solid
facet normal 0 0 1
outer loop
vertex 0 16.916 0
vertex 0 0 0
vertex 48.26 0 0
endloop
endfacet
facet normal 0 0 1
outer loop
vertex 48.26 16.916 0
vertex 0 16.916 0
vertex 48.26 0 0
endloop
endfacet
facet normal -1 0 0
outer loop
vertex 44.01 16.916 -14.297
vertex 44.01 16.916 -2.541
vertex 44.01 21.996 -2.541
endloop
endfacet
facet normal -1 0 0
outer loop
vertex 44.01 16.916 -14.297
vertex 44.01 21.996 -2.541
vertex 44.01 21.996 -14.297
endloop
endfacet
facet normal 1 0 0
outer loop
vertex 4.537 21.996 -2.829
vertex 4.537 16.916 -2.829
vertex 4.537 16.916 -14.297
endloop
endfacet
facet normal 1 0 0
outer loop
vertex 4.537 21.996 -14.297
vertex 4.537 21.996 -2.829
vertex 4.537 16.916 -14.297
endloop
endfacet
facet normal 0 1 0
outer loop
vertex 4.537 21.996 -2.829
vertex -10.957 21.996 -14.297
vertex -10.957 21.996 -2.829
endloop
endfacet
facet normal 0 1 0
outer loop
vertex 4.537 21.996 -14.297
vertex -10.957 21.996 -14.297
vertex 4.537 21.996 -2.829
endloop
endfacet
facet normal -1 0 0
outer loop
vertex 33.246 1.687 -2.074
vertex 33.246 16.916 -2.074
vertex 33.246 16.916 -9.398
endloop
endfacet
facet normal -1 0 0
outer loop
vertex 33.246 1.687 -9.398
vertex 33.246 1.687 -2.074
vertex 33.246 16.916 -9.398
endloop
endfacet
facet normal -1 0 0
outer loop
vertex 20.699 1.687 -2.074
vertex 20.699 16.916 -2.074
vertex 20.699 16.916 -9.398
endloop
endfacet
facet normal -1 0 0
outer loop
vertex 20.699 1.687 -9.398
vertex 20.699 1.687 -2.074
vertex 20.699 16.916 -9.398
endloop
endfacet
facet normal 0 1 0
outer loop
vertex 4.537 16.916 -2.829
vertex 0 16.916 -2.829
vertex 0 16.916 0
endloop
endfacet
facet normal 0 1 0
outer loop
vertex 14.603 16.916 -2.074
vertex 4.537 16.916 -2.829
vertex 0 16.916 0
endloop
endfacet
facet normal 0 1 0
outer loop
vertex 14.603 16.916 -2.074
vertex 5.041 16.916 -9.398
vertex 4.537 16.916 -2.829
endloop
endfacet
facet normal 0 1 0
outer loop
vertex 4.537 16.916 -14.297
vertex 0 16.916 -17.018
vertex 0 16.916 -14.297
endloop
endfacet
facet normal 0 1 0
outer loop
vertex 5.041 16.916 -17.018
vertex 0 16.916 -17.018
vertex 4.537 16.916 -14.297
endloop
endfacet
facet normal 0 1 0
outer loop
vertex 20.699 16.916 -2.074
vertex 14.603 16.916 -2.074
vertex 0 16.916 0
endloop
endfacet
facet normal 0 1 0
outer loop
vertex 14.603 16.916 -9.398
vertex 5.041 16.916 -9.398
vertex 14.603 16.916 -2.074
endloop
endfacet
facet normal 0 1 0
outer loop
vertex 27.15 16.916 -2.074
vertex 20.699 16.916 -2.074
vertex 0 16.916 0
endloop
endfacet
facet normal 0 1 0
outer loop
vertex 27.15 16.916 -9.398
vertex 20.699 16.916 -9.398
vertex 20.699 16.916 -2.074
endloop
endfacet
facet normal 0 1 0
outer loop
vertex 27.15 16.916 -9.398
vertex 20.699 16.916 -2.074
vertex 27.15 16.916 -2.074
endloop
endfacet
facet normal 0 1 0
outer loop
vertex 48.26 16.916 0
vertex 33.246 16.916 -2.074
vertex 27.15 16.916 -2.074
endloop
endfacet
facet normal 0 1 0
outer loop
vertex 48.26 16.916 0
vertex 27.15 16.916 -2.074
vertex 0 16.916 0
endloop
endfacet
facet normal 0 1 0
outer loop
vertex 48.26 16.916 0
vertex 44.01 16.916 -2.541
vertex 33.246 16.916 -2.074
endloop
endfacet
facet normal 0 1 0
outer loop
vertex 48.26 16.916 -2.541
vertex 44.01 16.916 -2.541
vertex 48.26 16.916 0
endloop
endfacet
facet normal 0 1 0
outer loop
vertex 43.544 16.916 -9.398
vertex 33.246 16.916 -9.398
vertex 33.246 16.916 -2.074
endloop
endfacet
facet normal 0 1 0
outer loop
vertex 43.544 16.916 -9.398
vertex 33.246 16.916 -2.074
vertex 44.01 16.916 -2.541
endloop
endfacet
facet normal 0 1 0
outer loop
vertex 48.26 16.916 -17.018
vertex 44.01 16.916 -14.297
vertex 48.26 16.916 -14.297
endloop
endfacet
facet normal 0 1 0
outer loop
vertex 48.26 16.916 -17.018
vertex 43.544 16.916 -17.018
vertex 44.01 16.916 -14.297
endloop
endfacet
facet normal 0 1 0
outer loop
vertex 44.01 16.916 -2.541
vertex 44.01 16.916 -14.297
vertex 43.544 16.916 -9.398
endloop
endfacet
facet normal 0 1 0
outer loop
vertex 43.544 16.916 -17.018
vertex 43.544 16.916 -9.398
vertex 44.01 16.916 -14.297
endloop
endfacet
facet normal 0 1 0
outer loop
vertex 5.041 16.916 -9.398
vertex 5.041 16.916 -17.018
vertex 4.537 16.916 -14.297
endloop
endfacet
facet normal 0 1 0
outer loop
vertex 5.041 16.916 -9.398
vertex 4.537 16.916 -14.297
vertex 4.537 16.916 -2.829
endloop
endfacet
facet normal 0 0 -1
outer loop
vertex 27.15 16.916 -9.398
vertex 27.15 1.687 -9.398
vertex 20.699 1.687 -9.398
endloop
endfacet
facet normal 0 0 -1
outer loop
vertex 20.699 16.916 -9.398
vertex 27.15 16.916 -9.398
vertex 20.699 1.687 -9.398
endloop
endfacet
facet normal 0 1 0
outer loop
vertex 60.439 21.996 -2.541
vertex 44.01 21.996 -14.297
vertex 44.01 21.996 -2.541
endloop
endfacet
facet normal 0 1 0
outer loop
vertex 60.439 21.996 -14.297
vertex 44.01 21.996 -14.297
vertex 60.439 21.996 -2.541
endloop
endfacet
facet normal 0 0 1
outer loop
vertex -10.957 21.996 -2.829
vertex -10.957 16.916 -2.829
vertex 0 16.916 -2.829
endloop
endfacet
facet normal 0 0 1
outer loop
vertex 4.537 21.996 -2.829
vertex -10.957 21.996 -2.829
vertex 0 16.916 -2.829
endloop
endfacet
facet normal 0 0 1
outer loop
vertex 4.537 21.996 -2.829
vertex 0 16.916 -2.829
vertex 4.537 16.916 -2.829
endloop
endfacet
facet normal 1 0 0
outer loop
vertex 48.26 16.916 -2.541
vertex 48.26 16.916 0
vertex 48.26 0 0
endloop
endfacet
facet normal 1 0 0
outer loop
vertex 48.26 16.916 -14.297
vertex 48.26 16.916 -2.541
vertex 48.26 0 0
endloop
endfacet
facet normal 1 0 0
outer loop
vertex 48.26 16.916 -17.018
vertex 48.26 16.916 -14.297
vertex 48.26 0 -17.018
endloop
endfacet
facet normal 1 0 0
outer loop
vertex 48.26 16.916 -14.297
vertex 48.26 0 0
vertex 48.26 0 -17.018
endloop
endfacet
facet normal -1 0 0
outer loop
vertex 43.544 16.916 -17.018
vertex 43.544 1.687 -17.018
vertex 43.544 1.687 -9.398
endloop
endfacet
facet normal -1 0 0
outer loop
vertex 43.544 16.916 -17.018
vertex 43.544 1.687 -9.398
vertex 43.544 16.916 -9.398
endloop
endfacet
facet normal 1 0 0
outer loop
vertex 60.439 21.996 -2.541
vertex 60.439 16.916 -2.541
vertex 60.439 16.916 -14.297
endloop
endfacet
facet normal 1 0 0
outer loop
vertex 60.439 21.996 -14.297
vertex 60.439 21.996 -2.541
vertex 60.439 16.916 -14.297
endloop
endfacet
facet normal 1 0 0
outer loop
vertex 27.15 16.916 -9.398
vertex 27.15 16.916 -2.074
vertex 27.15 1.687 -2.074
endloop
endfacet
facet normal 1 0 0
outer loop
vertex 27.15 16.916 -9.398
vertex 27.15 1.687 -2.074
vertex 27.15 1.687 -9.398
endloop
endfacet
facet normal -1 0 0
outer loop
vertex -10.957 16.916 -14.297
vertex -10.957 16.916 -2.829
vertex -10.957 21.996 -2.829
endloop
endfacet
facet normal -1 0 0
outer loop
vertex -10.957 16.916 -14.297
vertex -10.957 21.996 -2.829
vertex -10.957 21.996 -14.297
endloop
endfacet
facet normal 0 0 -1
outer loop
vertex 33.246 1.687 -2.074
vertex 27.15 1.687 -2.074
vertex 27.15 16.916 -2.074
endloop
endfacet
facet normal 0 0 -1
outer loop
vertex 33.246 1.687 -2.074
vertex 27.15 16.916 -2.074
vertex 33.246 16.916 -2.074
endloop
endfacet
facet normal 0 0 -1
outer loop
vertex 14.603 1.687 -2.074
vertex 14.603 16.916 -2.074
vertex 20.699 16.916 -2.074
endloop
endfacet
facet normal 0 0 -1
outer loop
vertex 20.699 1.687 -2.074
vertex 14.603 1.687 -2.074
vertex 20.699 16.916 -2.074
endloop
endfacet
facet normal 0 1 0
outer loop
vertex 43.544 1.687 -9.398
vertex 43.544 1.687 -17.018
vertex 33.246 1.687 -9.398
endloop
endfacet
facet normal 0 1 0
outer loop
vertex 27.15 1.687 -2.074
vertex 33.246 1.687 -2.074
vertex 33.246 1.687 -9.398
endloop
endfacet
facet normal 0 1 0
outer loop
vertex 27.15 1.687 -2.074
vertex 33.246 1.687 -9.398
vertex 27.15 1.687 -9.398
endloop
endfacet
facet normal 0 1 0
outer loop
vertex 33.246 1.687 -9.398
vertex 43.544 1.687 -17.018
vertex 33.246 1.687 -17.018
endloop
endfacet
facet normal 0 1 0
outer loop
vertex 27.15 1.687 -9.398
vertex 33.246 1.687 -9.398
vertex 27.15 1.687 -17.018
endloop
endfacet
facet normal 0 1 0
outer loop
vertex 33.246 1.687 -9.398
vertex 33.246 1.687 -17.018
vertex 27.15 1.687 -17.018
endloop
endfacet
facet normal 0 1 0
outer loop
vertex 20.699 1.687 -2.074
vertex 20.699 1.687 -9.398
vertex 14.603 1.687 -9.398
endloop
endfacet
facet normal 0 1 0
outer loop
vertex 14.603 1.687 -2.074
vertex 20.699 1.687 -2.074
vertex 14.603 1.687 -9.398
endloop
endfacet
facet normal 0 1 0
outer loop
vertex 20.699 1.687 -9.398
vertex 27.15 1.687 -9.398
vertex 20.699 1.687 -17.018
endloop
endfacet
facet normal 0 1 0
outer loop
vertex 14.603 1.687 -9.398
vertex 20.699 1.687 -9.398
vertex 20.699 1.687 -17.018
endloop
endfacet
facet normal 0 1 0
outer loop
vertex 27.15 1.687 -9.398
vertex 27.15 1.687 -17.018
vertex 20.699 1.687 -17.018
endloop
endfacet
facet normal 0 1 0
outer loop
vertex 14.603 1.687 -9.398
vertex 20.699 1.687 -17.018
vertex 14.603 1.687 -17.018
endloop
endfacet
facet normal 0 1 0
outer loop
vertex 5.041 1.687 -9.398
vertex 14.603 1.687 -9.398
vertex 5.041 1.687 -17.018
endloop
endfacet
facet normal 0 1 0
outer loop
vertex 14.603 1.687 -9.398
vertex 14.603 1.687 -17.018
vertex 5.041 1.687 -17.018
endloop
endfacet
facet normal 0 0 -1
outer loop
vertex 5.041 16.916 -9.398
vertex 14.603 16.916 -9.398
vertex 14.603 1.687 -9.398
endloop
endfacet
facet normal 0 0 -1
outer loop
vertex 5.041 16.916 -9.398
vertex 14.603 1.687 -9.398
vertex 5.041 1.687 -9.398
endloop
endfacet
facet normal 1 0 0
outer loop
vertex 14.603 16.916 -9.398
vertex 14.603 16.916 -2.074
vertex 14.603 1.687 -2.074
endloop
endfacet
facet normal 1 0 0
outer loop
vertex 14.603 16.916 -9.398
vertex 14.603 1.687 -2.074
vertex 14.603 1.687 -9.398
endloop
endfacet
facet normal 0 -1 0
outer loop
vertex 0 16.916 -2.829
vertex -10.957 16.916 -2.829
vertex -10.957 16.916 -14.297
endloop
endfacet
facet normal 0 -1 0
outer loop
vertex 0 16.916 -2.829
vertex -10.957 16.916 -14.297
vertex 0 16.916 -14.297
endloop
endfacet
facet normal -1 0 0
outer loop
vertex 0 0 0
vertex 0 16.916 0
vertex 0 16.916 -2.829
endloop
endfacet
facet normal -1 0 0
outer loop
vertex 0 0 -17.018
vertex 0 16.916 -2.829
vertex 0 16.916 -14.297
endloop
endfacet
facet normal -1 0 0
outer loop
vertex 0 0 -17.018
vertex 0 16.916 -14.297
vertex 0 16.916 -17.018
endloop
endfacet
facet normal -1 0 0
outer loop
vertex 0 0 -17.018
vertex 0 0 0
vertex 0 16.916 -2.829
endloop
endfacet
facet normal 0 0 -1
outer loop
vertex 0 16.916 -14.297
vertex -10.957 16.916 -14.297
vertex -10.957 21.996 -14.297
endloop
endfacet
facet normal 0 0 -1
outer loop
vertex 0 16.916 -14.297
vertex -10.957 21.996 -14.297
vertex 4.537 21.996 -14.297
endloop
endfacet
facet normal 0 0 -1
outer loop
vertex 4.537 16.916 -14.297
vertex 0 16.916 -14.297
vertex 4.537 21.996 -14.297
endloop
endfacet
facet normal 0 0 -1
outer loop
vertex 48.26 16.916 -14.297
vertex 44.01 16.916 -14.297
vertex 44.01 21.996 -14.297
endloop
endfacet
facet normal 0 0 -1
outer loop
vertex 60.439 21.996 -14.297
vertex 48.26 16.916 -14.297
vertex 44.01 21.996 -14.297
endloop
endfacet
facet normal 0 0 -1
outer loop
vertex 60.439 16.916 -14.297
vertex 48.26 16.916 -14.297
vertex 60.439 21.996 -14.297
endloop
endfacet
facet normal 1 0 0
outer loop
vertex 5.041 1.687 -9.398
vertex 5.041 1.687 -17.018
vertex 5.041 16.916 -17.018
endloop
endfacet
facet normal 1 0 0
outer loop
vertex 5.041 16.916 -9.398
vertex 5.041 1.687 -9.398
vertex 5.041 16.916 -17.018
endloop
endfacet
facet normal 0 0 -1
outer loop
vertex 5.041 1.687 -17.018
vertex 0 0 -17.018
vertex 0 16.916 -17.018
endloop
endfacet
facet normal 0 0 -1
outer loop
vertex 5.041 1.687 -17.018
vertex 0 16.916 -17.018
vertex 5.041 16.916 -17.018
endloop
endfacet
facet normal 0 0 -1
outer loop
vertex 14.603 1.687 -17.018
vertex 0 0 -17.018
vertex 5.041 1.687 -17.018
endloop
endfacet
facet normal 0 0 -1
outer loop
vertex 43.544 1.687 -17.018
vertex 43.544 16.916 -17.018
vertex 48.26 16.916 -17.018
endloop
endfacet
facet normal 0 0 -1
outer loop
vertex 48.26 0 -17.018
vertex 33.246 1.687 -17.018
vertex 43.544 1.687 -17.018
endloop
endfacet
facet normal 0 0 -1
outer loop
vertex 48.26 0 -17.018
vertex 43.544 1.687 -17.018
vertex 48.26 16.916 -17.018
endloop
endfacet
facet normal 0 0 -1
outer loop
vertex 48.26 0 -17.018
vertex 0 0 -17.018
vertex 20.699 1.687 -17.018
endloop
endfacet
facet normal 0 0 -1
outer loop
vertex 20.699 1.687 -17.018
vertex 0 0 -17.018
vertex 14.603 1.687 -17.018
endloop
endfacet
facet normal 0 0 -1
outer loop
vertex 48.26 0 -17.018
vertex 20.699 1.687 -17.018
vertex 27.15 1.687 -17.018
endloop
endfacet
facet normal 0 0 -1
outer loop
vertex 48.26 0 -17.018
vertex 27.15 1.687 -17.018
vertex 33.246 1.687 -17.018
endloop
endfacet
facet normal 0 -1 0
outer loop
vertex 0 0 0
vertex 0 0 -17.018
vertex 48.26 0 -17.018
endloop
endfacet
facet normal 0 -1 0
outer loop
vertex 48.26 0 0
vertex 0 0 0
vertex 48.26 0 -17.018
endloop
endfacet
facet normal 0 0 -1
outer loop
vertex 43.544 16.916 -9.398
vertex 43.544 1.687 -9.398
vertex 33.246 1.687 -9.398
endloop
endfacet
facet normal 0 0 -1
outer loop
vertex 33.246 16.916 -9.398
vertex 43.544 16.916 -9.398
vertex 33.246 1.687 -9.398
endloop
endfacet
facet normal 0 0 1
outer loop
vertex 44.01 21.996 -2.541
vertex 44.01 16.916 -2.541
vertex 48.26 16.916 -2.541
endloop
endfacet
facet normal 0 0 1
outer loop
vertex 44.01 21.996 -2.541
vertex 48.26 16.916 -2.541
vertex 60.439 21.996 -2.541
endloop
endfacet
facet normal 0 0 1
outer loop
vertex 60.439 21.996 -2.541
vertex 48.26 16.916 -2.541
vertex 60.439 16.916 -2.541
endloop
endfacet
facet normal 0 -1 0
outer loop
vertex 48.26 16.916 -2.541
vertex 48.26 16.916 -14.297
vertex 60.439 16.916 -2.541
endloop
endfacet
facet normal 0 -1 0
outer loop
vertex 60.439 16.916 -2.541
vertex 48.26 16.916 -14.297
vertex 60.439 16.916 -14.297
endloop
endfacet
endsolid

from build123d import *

# Parameters (mm, degrees)
SKETCH1_W           = 48.26
SKETCH1_H           = 17.018
BOSS_EXTRUDE1_DEPTH = 16.9164
SKETCH3_W           = 38.503555909
SKETCH3_H           = 15.229875851
CUT_EXTRUDE1_DEPTH  = 7.62
SKETCH4_W           = 6.096
SKETCH4_H           = 14.944038535
CUT_EXTRUDE2_DEPTH  = 15.24
SKETCH5_W           = 15.494422394
SKETCH5_H           = 11.468029568
SKETCH5_W_2         = 16.429120729
SKETCH5_H_2         = 11.755629056
BOSS_EXTRUDE2_DEPTH = 5.08


with BuildPart() as part:
    # Sketch1 → Boss-Extrude1 (new body)
    with BuildSketch(Plane(origin=(0, 0, 0), x_dir=(1, 0, 0), z_dir=(0, 1, 0))):
        with Locations((24.13, 8.509)):
            Rectangle(SKETCH1_W, SKETCH1_H)
    extrude(amount=BOSS_EXTRUDE1_DEPTH)

    # Sketch3 → Cut-Extrude1 (cut)
    with BuildSketch(Plane(origin=(0, 0, -17.018), x_dir=(-1, 0, 0), z_dir=(0, 0, -1))):
        with Locations((-24.292361965, 9.301462074)):
            Rectangle(SKETCH3_W, SKETCH3_H)
    extrude(amount=-CUT_EXTRUDE1_DEPTH, mode=Mode.SUBTRACT)

    # Sketch4 → Cut-Extrude2 (cut)
    with BuildSketch(Plane(origin=(0, 1.686524149, 0), x_dir=(1, 0, 0), z_dir=(0, 1, 0))):
        with Locations((17.651266973, 9.545980733)):
            Rectangle(SKETCH4_W, SKETCH4_H)
        with Locations((30.19779462, 9.545980733)):
            Rectangle(SKETCH4_W, SKETCH4_H)
    extrude(amount=CUT_EXTRUDE2_DEPTH, mode=Mode.SUBTRACT)

    # Sketch5 → Boss-Extrude2 (add)
    with BuildSketch(Plane(origin=(0, 16.9164, 0), x_dir=(1, 0, 0), z_dir=(0, 1, 0))):
        with Locations((-3.20992629, 8.562924904)):
            Rectangle(SKETCH5_W, SKETCH5_H)
        with Locations((52.224874945, 8.41912516)):
            Rectangle(SKETCH5_W_2, SKETCH5_H_2)
    extrude(amount=BOSS_EXTRUDE2_DEPTH)


solid = part.part
